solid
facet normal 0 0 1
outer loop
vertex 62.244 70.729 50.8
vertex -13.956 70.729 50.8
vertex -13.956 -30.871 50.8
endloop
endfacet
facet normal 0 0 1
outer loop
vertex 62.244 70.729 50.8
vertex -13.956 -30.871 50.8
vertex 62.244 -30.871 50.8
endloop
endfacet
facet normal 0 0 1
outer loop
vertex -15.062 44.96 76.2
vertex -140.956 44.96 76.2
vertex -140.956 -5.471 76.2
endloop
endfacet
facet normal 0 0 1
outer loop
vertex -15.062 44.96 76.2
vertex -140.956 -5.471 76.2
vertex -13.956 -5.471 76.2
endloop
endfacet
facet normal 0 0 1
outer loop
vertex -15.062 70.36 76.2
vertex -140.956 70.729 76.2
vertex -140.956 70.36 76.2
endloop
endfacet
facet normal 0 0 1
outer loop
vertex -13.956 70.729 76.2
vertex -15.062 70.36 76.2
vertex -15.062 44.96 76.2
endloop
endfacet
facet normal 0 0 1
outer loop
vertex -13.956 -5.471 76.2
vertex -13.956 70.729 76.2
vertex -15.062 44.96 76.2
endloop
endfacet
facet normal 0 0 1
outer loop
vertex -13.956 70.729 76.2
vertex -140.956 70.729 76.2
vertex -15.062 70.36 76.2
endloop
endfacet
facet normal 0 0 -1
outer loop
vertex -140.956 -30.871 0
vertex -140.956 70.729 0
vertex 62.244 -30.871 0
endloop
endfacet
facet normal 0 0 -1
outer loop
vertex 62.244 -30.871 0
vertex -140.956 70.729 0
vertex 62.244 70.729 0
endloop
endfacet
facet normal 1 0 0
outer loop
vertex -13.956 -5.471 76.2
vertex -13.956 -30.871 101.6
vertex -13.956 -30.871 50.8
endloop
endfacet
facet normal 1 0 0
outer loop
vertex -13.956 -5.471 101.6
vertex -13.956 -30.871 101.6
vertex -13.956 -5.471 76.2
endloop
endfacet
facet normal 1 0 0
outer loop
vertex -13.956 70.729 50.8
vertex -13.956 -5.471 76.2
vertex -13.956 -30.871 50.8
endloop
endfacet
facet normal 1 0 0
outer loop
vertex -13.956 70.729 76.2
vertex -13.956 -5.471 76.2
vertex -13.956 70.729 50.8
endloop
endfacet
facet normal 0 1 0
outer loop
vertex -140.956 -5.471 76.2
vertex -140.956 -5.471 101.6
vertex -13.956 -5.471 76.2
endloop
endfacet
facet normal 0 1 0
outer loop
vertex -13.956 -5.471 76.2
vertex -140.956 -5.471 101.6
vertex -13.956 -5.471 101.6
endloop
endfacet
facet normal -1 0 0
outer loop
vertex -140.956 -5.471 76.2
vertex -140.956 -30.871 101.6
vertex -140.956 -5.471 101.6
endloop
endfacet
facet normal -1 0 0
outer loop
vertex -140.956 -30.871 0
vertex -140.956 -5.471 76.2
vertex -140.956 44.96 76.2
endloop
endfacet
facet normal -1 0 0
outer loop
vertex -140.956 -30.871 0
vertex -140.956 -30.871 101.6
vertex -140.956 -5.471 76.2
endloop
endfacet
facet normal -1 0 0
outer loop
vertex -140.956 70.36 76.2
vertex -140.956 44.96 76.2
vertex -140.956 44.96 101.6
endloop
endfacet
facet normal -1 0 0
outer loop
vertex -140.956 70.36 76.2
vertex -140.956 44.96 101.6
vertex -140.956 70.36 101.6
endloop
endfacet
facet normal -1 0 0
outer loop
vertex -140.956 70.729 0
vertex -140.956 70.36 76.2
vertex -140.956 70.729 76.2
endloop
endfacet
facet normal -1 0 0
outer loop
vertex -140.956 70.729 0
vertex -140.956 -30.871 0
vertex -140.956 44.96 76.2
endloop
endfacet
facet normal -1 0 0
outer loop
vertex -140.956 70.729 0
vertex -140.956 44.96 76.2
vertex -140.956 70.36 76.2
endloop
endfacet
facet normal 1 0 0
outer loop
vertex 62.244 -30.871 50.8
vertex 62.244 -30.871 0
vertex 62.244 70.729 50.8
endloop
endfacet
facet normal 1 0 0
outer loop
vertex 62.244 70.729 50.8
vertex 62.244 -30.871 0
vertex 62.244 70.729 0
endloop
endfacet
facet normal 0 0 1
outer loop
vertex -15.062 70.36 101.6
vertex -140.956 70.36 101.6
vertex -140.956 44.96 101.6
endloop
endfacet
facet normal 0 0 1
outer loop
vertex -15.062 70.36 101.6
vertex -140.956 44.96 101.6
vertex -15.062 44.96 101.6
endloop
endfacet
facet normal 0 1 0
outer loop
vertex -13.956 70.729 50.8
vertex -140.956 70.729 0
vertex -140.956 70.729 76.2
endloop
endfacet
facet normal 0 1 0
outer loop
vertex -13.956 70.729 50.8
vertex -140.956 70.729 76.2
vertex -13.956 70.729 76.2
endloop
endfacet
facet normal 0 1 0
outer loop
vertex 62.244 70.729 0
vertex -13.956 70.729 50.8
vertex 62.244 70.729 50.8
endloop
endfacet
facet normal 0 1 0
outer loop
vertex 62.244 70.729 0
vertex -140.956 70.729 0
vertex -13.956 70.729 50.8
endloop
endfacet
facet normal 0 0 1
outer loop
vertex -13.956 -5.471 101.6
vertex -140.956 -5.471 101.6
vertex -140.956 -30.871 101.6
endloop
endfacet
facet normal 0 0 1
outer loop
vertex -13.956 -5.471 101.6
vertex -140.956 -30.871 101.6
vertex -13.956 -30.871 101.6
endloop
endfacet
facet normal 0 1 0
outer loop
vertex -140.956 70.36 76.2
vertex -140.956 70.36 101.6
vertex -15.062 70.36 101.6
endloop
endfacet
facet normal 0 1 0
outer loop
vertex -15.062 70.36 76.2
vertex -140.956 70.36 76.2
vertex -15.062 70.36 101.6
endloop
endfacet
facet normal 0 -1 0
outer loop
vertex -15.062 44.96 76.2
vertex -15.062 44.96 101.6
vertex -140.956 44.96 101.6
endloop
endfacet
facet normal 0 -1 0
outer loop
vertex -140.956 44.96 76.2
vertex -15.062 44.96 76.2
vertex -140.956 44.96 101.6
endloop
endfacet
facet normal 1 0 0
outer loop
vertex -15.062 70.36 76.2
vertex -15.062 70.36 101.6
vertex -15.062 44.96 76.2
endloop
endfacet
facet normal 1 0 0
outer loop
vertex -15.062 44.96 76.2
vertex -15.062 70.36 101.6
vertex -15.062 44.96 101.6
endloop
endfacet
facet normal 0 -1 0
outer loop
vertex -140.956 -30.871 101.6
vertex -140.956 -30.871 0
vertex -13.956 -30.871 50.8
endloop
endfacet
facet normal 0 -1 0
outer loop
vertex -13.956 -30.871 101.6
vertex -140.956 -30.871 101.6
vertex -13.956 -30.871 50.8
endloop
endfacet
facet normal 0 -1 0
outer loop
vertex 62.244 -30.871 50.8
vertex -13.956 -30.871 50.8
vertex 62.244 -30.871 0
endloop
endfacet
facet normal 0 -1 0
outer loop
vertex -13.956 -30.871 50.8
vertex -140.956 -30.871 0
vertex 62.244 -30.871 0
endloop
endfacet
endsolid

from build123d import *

# Parameters (mm, degrees)
F0_W     = 203.2
F0_H     = 101.6
F1_DEPTH = 101.6
F2_W     = 76.2
F2_H     = 101.6
F3_DEPTH = 50.8
F6_DEPTH = 25.4


with BuildPart() as f1:
    # F0 (on Top) → F1 (new body)
    with BuildSketch(Plane.XY):
        with Locations((-39.355746, 19.929246)):
            Rectangle(F0_W, F0_H)
    extrude(amount=F1_DEPTH)

    # F2 (on face) → F3 (cut)
    with BuildSketch(Plane.XY.offset(101.6)):
        with Locations((24.144254, 19.929246)):
            Rectangle(F2_W, F2_H)
    extrude(amount=-F3_DEPTH, mode=Mode.SUBTRACT)

    # F5 (on face) → F6 (cut)
    with BuildSketch(Plane.XY.offset(101.6)):
        Polygon((-140.955746, 70.729246), (-140.955746, 70.360331), (-15.061975, 70.360331), (-15.061975, 44.960331), (-140.955746, 44.960331), (-140.955746, -5.470754), (-13.955746, -5.470754), (-13.955746, 70.729246), align=None)
    extrude(amount=-F6_DEPTH, mode=Mode.SUBTRACT)


solid = f1.part
